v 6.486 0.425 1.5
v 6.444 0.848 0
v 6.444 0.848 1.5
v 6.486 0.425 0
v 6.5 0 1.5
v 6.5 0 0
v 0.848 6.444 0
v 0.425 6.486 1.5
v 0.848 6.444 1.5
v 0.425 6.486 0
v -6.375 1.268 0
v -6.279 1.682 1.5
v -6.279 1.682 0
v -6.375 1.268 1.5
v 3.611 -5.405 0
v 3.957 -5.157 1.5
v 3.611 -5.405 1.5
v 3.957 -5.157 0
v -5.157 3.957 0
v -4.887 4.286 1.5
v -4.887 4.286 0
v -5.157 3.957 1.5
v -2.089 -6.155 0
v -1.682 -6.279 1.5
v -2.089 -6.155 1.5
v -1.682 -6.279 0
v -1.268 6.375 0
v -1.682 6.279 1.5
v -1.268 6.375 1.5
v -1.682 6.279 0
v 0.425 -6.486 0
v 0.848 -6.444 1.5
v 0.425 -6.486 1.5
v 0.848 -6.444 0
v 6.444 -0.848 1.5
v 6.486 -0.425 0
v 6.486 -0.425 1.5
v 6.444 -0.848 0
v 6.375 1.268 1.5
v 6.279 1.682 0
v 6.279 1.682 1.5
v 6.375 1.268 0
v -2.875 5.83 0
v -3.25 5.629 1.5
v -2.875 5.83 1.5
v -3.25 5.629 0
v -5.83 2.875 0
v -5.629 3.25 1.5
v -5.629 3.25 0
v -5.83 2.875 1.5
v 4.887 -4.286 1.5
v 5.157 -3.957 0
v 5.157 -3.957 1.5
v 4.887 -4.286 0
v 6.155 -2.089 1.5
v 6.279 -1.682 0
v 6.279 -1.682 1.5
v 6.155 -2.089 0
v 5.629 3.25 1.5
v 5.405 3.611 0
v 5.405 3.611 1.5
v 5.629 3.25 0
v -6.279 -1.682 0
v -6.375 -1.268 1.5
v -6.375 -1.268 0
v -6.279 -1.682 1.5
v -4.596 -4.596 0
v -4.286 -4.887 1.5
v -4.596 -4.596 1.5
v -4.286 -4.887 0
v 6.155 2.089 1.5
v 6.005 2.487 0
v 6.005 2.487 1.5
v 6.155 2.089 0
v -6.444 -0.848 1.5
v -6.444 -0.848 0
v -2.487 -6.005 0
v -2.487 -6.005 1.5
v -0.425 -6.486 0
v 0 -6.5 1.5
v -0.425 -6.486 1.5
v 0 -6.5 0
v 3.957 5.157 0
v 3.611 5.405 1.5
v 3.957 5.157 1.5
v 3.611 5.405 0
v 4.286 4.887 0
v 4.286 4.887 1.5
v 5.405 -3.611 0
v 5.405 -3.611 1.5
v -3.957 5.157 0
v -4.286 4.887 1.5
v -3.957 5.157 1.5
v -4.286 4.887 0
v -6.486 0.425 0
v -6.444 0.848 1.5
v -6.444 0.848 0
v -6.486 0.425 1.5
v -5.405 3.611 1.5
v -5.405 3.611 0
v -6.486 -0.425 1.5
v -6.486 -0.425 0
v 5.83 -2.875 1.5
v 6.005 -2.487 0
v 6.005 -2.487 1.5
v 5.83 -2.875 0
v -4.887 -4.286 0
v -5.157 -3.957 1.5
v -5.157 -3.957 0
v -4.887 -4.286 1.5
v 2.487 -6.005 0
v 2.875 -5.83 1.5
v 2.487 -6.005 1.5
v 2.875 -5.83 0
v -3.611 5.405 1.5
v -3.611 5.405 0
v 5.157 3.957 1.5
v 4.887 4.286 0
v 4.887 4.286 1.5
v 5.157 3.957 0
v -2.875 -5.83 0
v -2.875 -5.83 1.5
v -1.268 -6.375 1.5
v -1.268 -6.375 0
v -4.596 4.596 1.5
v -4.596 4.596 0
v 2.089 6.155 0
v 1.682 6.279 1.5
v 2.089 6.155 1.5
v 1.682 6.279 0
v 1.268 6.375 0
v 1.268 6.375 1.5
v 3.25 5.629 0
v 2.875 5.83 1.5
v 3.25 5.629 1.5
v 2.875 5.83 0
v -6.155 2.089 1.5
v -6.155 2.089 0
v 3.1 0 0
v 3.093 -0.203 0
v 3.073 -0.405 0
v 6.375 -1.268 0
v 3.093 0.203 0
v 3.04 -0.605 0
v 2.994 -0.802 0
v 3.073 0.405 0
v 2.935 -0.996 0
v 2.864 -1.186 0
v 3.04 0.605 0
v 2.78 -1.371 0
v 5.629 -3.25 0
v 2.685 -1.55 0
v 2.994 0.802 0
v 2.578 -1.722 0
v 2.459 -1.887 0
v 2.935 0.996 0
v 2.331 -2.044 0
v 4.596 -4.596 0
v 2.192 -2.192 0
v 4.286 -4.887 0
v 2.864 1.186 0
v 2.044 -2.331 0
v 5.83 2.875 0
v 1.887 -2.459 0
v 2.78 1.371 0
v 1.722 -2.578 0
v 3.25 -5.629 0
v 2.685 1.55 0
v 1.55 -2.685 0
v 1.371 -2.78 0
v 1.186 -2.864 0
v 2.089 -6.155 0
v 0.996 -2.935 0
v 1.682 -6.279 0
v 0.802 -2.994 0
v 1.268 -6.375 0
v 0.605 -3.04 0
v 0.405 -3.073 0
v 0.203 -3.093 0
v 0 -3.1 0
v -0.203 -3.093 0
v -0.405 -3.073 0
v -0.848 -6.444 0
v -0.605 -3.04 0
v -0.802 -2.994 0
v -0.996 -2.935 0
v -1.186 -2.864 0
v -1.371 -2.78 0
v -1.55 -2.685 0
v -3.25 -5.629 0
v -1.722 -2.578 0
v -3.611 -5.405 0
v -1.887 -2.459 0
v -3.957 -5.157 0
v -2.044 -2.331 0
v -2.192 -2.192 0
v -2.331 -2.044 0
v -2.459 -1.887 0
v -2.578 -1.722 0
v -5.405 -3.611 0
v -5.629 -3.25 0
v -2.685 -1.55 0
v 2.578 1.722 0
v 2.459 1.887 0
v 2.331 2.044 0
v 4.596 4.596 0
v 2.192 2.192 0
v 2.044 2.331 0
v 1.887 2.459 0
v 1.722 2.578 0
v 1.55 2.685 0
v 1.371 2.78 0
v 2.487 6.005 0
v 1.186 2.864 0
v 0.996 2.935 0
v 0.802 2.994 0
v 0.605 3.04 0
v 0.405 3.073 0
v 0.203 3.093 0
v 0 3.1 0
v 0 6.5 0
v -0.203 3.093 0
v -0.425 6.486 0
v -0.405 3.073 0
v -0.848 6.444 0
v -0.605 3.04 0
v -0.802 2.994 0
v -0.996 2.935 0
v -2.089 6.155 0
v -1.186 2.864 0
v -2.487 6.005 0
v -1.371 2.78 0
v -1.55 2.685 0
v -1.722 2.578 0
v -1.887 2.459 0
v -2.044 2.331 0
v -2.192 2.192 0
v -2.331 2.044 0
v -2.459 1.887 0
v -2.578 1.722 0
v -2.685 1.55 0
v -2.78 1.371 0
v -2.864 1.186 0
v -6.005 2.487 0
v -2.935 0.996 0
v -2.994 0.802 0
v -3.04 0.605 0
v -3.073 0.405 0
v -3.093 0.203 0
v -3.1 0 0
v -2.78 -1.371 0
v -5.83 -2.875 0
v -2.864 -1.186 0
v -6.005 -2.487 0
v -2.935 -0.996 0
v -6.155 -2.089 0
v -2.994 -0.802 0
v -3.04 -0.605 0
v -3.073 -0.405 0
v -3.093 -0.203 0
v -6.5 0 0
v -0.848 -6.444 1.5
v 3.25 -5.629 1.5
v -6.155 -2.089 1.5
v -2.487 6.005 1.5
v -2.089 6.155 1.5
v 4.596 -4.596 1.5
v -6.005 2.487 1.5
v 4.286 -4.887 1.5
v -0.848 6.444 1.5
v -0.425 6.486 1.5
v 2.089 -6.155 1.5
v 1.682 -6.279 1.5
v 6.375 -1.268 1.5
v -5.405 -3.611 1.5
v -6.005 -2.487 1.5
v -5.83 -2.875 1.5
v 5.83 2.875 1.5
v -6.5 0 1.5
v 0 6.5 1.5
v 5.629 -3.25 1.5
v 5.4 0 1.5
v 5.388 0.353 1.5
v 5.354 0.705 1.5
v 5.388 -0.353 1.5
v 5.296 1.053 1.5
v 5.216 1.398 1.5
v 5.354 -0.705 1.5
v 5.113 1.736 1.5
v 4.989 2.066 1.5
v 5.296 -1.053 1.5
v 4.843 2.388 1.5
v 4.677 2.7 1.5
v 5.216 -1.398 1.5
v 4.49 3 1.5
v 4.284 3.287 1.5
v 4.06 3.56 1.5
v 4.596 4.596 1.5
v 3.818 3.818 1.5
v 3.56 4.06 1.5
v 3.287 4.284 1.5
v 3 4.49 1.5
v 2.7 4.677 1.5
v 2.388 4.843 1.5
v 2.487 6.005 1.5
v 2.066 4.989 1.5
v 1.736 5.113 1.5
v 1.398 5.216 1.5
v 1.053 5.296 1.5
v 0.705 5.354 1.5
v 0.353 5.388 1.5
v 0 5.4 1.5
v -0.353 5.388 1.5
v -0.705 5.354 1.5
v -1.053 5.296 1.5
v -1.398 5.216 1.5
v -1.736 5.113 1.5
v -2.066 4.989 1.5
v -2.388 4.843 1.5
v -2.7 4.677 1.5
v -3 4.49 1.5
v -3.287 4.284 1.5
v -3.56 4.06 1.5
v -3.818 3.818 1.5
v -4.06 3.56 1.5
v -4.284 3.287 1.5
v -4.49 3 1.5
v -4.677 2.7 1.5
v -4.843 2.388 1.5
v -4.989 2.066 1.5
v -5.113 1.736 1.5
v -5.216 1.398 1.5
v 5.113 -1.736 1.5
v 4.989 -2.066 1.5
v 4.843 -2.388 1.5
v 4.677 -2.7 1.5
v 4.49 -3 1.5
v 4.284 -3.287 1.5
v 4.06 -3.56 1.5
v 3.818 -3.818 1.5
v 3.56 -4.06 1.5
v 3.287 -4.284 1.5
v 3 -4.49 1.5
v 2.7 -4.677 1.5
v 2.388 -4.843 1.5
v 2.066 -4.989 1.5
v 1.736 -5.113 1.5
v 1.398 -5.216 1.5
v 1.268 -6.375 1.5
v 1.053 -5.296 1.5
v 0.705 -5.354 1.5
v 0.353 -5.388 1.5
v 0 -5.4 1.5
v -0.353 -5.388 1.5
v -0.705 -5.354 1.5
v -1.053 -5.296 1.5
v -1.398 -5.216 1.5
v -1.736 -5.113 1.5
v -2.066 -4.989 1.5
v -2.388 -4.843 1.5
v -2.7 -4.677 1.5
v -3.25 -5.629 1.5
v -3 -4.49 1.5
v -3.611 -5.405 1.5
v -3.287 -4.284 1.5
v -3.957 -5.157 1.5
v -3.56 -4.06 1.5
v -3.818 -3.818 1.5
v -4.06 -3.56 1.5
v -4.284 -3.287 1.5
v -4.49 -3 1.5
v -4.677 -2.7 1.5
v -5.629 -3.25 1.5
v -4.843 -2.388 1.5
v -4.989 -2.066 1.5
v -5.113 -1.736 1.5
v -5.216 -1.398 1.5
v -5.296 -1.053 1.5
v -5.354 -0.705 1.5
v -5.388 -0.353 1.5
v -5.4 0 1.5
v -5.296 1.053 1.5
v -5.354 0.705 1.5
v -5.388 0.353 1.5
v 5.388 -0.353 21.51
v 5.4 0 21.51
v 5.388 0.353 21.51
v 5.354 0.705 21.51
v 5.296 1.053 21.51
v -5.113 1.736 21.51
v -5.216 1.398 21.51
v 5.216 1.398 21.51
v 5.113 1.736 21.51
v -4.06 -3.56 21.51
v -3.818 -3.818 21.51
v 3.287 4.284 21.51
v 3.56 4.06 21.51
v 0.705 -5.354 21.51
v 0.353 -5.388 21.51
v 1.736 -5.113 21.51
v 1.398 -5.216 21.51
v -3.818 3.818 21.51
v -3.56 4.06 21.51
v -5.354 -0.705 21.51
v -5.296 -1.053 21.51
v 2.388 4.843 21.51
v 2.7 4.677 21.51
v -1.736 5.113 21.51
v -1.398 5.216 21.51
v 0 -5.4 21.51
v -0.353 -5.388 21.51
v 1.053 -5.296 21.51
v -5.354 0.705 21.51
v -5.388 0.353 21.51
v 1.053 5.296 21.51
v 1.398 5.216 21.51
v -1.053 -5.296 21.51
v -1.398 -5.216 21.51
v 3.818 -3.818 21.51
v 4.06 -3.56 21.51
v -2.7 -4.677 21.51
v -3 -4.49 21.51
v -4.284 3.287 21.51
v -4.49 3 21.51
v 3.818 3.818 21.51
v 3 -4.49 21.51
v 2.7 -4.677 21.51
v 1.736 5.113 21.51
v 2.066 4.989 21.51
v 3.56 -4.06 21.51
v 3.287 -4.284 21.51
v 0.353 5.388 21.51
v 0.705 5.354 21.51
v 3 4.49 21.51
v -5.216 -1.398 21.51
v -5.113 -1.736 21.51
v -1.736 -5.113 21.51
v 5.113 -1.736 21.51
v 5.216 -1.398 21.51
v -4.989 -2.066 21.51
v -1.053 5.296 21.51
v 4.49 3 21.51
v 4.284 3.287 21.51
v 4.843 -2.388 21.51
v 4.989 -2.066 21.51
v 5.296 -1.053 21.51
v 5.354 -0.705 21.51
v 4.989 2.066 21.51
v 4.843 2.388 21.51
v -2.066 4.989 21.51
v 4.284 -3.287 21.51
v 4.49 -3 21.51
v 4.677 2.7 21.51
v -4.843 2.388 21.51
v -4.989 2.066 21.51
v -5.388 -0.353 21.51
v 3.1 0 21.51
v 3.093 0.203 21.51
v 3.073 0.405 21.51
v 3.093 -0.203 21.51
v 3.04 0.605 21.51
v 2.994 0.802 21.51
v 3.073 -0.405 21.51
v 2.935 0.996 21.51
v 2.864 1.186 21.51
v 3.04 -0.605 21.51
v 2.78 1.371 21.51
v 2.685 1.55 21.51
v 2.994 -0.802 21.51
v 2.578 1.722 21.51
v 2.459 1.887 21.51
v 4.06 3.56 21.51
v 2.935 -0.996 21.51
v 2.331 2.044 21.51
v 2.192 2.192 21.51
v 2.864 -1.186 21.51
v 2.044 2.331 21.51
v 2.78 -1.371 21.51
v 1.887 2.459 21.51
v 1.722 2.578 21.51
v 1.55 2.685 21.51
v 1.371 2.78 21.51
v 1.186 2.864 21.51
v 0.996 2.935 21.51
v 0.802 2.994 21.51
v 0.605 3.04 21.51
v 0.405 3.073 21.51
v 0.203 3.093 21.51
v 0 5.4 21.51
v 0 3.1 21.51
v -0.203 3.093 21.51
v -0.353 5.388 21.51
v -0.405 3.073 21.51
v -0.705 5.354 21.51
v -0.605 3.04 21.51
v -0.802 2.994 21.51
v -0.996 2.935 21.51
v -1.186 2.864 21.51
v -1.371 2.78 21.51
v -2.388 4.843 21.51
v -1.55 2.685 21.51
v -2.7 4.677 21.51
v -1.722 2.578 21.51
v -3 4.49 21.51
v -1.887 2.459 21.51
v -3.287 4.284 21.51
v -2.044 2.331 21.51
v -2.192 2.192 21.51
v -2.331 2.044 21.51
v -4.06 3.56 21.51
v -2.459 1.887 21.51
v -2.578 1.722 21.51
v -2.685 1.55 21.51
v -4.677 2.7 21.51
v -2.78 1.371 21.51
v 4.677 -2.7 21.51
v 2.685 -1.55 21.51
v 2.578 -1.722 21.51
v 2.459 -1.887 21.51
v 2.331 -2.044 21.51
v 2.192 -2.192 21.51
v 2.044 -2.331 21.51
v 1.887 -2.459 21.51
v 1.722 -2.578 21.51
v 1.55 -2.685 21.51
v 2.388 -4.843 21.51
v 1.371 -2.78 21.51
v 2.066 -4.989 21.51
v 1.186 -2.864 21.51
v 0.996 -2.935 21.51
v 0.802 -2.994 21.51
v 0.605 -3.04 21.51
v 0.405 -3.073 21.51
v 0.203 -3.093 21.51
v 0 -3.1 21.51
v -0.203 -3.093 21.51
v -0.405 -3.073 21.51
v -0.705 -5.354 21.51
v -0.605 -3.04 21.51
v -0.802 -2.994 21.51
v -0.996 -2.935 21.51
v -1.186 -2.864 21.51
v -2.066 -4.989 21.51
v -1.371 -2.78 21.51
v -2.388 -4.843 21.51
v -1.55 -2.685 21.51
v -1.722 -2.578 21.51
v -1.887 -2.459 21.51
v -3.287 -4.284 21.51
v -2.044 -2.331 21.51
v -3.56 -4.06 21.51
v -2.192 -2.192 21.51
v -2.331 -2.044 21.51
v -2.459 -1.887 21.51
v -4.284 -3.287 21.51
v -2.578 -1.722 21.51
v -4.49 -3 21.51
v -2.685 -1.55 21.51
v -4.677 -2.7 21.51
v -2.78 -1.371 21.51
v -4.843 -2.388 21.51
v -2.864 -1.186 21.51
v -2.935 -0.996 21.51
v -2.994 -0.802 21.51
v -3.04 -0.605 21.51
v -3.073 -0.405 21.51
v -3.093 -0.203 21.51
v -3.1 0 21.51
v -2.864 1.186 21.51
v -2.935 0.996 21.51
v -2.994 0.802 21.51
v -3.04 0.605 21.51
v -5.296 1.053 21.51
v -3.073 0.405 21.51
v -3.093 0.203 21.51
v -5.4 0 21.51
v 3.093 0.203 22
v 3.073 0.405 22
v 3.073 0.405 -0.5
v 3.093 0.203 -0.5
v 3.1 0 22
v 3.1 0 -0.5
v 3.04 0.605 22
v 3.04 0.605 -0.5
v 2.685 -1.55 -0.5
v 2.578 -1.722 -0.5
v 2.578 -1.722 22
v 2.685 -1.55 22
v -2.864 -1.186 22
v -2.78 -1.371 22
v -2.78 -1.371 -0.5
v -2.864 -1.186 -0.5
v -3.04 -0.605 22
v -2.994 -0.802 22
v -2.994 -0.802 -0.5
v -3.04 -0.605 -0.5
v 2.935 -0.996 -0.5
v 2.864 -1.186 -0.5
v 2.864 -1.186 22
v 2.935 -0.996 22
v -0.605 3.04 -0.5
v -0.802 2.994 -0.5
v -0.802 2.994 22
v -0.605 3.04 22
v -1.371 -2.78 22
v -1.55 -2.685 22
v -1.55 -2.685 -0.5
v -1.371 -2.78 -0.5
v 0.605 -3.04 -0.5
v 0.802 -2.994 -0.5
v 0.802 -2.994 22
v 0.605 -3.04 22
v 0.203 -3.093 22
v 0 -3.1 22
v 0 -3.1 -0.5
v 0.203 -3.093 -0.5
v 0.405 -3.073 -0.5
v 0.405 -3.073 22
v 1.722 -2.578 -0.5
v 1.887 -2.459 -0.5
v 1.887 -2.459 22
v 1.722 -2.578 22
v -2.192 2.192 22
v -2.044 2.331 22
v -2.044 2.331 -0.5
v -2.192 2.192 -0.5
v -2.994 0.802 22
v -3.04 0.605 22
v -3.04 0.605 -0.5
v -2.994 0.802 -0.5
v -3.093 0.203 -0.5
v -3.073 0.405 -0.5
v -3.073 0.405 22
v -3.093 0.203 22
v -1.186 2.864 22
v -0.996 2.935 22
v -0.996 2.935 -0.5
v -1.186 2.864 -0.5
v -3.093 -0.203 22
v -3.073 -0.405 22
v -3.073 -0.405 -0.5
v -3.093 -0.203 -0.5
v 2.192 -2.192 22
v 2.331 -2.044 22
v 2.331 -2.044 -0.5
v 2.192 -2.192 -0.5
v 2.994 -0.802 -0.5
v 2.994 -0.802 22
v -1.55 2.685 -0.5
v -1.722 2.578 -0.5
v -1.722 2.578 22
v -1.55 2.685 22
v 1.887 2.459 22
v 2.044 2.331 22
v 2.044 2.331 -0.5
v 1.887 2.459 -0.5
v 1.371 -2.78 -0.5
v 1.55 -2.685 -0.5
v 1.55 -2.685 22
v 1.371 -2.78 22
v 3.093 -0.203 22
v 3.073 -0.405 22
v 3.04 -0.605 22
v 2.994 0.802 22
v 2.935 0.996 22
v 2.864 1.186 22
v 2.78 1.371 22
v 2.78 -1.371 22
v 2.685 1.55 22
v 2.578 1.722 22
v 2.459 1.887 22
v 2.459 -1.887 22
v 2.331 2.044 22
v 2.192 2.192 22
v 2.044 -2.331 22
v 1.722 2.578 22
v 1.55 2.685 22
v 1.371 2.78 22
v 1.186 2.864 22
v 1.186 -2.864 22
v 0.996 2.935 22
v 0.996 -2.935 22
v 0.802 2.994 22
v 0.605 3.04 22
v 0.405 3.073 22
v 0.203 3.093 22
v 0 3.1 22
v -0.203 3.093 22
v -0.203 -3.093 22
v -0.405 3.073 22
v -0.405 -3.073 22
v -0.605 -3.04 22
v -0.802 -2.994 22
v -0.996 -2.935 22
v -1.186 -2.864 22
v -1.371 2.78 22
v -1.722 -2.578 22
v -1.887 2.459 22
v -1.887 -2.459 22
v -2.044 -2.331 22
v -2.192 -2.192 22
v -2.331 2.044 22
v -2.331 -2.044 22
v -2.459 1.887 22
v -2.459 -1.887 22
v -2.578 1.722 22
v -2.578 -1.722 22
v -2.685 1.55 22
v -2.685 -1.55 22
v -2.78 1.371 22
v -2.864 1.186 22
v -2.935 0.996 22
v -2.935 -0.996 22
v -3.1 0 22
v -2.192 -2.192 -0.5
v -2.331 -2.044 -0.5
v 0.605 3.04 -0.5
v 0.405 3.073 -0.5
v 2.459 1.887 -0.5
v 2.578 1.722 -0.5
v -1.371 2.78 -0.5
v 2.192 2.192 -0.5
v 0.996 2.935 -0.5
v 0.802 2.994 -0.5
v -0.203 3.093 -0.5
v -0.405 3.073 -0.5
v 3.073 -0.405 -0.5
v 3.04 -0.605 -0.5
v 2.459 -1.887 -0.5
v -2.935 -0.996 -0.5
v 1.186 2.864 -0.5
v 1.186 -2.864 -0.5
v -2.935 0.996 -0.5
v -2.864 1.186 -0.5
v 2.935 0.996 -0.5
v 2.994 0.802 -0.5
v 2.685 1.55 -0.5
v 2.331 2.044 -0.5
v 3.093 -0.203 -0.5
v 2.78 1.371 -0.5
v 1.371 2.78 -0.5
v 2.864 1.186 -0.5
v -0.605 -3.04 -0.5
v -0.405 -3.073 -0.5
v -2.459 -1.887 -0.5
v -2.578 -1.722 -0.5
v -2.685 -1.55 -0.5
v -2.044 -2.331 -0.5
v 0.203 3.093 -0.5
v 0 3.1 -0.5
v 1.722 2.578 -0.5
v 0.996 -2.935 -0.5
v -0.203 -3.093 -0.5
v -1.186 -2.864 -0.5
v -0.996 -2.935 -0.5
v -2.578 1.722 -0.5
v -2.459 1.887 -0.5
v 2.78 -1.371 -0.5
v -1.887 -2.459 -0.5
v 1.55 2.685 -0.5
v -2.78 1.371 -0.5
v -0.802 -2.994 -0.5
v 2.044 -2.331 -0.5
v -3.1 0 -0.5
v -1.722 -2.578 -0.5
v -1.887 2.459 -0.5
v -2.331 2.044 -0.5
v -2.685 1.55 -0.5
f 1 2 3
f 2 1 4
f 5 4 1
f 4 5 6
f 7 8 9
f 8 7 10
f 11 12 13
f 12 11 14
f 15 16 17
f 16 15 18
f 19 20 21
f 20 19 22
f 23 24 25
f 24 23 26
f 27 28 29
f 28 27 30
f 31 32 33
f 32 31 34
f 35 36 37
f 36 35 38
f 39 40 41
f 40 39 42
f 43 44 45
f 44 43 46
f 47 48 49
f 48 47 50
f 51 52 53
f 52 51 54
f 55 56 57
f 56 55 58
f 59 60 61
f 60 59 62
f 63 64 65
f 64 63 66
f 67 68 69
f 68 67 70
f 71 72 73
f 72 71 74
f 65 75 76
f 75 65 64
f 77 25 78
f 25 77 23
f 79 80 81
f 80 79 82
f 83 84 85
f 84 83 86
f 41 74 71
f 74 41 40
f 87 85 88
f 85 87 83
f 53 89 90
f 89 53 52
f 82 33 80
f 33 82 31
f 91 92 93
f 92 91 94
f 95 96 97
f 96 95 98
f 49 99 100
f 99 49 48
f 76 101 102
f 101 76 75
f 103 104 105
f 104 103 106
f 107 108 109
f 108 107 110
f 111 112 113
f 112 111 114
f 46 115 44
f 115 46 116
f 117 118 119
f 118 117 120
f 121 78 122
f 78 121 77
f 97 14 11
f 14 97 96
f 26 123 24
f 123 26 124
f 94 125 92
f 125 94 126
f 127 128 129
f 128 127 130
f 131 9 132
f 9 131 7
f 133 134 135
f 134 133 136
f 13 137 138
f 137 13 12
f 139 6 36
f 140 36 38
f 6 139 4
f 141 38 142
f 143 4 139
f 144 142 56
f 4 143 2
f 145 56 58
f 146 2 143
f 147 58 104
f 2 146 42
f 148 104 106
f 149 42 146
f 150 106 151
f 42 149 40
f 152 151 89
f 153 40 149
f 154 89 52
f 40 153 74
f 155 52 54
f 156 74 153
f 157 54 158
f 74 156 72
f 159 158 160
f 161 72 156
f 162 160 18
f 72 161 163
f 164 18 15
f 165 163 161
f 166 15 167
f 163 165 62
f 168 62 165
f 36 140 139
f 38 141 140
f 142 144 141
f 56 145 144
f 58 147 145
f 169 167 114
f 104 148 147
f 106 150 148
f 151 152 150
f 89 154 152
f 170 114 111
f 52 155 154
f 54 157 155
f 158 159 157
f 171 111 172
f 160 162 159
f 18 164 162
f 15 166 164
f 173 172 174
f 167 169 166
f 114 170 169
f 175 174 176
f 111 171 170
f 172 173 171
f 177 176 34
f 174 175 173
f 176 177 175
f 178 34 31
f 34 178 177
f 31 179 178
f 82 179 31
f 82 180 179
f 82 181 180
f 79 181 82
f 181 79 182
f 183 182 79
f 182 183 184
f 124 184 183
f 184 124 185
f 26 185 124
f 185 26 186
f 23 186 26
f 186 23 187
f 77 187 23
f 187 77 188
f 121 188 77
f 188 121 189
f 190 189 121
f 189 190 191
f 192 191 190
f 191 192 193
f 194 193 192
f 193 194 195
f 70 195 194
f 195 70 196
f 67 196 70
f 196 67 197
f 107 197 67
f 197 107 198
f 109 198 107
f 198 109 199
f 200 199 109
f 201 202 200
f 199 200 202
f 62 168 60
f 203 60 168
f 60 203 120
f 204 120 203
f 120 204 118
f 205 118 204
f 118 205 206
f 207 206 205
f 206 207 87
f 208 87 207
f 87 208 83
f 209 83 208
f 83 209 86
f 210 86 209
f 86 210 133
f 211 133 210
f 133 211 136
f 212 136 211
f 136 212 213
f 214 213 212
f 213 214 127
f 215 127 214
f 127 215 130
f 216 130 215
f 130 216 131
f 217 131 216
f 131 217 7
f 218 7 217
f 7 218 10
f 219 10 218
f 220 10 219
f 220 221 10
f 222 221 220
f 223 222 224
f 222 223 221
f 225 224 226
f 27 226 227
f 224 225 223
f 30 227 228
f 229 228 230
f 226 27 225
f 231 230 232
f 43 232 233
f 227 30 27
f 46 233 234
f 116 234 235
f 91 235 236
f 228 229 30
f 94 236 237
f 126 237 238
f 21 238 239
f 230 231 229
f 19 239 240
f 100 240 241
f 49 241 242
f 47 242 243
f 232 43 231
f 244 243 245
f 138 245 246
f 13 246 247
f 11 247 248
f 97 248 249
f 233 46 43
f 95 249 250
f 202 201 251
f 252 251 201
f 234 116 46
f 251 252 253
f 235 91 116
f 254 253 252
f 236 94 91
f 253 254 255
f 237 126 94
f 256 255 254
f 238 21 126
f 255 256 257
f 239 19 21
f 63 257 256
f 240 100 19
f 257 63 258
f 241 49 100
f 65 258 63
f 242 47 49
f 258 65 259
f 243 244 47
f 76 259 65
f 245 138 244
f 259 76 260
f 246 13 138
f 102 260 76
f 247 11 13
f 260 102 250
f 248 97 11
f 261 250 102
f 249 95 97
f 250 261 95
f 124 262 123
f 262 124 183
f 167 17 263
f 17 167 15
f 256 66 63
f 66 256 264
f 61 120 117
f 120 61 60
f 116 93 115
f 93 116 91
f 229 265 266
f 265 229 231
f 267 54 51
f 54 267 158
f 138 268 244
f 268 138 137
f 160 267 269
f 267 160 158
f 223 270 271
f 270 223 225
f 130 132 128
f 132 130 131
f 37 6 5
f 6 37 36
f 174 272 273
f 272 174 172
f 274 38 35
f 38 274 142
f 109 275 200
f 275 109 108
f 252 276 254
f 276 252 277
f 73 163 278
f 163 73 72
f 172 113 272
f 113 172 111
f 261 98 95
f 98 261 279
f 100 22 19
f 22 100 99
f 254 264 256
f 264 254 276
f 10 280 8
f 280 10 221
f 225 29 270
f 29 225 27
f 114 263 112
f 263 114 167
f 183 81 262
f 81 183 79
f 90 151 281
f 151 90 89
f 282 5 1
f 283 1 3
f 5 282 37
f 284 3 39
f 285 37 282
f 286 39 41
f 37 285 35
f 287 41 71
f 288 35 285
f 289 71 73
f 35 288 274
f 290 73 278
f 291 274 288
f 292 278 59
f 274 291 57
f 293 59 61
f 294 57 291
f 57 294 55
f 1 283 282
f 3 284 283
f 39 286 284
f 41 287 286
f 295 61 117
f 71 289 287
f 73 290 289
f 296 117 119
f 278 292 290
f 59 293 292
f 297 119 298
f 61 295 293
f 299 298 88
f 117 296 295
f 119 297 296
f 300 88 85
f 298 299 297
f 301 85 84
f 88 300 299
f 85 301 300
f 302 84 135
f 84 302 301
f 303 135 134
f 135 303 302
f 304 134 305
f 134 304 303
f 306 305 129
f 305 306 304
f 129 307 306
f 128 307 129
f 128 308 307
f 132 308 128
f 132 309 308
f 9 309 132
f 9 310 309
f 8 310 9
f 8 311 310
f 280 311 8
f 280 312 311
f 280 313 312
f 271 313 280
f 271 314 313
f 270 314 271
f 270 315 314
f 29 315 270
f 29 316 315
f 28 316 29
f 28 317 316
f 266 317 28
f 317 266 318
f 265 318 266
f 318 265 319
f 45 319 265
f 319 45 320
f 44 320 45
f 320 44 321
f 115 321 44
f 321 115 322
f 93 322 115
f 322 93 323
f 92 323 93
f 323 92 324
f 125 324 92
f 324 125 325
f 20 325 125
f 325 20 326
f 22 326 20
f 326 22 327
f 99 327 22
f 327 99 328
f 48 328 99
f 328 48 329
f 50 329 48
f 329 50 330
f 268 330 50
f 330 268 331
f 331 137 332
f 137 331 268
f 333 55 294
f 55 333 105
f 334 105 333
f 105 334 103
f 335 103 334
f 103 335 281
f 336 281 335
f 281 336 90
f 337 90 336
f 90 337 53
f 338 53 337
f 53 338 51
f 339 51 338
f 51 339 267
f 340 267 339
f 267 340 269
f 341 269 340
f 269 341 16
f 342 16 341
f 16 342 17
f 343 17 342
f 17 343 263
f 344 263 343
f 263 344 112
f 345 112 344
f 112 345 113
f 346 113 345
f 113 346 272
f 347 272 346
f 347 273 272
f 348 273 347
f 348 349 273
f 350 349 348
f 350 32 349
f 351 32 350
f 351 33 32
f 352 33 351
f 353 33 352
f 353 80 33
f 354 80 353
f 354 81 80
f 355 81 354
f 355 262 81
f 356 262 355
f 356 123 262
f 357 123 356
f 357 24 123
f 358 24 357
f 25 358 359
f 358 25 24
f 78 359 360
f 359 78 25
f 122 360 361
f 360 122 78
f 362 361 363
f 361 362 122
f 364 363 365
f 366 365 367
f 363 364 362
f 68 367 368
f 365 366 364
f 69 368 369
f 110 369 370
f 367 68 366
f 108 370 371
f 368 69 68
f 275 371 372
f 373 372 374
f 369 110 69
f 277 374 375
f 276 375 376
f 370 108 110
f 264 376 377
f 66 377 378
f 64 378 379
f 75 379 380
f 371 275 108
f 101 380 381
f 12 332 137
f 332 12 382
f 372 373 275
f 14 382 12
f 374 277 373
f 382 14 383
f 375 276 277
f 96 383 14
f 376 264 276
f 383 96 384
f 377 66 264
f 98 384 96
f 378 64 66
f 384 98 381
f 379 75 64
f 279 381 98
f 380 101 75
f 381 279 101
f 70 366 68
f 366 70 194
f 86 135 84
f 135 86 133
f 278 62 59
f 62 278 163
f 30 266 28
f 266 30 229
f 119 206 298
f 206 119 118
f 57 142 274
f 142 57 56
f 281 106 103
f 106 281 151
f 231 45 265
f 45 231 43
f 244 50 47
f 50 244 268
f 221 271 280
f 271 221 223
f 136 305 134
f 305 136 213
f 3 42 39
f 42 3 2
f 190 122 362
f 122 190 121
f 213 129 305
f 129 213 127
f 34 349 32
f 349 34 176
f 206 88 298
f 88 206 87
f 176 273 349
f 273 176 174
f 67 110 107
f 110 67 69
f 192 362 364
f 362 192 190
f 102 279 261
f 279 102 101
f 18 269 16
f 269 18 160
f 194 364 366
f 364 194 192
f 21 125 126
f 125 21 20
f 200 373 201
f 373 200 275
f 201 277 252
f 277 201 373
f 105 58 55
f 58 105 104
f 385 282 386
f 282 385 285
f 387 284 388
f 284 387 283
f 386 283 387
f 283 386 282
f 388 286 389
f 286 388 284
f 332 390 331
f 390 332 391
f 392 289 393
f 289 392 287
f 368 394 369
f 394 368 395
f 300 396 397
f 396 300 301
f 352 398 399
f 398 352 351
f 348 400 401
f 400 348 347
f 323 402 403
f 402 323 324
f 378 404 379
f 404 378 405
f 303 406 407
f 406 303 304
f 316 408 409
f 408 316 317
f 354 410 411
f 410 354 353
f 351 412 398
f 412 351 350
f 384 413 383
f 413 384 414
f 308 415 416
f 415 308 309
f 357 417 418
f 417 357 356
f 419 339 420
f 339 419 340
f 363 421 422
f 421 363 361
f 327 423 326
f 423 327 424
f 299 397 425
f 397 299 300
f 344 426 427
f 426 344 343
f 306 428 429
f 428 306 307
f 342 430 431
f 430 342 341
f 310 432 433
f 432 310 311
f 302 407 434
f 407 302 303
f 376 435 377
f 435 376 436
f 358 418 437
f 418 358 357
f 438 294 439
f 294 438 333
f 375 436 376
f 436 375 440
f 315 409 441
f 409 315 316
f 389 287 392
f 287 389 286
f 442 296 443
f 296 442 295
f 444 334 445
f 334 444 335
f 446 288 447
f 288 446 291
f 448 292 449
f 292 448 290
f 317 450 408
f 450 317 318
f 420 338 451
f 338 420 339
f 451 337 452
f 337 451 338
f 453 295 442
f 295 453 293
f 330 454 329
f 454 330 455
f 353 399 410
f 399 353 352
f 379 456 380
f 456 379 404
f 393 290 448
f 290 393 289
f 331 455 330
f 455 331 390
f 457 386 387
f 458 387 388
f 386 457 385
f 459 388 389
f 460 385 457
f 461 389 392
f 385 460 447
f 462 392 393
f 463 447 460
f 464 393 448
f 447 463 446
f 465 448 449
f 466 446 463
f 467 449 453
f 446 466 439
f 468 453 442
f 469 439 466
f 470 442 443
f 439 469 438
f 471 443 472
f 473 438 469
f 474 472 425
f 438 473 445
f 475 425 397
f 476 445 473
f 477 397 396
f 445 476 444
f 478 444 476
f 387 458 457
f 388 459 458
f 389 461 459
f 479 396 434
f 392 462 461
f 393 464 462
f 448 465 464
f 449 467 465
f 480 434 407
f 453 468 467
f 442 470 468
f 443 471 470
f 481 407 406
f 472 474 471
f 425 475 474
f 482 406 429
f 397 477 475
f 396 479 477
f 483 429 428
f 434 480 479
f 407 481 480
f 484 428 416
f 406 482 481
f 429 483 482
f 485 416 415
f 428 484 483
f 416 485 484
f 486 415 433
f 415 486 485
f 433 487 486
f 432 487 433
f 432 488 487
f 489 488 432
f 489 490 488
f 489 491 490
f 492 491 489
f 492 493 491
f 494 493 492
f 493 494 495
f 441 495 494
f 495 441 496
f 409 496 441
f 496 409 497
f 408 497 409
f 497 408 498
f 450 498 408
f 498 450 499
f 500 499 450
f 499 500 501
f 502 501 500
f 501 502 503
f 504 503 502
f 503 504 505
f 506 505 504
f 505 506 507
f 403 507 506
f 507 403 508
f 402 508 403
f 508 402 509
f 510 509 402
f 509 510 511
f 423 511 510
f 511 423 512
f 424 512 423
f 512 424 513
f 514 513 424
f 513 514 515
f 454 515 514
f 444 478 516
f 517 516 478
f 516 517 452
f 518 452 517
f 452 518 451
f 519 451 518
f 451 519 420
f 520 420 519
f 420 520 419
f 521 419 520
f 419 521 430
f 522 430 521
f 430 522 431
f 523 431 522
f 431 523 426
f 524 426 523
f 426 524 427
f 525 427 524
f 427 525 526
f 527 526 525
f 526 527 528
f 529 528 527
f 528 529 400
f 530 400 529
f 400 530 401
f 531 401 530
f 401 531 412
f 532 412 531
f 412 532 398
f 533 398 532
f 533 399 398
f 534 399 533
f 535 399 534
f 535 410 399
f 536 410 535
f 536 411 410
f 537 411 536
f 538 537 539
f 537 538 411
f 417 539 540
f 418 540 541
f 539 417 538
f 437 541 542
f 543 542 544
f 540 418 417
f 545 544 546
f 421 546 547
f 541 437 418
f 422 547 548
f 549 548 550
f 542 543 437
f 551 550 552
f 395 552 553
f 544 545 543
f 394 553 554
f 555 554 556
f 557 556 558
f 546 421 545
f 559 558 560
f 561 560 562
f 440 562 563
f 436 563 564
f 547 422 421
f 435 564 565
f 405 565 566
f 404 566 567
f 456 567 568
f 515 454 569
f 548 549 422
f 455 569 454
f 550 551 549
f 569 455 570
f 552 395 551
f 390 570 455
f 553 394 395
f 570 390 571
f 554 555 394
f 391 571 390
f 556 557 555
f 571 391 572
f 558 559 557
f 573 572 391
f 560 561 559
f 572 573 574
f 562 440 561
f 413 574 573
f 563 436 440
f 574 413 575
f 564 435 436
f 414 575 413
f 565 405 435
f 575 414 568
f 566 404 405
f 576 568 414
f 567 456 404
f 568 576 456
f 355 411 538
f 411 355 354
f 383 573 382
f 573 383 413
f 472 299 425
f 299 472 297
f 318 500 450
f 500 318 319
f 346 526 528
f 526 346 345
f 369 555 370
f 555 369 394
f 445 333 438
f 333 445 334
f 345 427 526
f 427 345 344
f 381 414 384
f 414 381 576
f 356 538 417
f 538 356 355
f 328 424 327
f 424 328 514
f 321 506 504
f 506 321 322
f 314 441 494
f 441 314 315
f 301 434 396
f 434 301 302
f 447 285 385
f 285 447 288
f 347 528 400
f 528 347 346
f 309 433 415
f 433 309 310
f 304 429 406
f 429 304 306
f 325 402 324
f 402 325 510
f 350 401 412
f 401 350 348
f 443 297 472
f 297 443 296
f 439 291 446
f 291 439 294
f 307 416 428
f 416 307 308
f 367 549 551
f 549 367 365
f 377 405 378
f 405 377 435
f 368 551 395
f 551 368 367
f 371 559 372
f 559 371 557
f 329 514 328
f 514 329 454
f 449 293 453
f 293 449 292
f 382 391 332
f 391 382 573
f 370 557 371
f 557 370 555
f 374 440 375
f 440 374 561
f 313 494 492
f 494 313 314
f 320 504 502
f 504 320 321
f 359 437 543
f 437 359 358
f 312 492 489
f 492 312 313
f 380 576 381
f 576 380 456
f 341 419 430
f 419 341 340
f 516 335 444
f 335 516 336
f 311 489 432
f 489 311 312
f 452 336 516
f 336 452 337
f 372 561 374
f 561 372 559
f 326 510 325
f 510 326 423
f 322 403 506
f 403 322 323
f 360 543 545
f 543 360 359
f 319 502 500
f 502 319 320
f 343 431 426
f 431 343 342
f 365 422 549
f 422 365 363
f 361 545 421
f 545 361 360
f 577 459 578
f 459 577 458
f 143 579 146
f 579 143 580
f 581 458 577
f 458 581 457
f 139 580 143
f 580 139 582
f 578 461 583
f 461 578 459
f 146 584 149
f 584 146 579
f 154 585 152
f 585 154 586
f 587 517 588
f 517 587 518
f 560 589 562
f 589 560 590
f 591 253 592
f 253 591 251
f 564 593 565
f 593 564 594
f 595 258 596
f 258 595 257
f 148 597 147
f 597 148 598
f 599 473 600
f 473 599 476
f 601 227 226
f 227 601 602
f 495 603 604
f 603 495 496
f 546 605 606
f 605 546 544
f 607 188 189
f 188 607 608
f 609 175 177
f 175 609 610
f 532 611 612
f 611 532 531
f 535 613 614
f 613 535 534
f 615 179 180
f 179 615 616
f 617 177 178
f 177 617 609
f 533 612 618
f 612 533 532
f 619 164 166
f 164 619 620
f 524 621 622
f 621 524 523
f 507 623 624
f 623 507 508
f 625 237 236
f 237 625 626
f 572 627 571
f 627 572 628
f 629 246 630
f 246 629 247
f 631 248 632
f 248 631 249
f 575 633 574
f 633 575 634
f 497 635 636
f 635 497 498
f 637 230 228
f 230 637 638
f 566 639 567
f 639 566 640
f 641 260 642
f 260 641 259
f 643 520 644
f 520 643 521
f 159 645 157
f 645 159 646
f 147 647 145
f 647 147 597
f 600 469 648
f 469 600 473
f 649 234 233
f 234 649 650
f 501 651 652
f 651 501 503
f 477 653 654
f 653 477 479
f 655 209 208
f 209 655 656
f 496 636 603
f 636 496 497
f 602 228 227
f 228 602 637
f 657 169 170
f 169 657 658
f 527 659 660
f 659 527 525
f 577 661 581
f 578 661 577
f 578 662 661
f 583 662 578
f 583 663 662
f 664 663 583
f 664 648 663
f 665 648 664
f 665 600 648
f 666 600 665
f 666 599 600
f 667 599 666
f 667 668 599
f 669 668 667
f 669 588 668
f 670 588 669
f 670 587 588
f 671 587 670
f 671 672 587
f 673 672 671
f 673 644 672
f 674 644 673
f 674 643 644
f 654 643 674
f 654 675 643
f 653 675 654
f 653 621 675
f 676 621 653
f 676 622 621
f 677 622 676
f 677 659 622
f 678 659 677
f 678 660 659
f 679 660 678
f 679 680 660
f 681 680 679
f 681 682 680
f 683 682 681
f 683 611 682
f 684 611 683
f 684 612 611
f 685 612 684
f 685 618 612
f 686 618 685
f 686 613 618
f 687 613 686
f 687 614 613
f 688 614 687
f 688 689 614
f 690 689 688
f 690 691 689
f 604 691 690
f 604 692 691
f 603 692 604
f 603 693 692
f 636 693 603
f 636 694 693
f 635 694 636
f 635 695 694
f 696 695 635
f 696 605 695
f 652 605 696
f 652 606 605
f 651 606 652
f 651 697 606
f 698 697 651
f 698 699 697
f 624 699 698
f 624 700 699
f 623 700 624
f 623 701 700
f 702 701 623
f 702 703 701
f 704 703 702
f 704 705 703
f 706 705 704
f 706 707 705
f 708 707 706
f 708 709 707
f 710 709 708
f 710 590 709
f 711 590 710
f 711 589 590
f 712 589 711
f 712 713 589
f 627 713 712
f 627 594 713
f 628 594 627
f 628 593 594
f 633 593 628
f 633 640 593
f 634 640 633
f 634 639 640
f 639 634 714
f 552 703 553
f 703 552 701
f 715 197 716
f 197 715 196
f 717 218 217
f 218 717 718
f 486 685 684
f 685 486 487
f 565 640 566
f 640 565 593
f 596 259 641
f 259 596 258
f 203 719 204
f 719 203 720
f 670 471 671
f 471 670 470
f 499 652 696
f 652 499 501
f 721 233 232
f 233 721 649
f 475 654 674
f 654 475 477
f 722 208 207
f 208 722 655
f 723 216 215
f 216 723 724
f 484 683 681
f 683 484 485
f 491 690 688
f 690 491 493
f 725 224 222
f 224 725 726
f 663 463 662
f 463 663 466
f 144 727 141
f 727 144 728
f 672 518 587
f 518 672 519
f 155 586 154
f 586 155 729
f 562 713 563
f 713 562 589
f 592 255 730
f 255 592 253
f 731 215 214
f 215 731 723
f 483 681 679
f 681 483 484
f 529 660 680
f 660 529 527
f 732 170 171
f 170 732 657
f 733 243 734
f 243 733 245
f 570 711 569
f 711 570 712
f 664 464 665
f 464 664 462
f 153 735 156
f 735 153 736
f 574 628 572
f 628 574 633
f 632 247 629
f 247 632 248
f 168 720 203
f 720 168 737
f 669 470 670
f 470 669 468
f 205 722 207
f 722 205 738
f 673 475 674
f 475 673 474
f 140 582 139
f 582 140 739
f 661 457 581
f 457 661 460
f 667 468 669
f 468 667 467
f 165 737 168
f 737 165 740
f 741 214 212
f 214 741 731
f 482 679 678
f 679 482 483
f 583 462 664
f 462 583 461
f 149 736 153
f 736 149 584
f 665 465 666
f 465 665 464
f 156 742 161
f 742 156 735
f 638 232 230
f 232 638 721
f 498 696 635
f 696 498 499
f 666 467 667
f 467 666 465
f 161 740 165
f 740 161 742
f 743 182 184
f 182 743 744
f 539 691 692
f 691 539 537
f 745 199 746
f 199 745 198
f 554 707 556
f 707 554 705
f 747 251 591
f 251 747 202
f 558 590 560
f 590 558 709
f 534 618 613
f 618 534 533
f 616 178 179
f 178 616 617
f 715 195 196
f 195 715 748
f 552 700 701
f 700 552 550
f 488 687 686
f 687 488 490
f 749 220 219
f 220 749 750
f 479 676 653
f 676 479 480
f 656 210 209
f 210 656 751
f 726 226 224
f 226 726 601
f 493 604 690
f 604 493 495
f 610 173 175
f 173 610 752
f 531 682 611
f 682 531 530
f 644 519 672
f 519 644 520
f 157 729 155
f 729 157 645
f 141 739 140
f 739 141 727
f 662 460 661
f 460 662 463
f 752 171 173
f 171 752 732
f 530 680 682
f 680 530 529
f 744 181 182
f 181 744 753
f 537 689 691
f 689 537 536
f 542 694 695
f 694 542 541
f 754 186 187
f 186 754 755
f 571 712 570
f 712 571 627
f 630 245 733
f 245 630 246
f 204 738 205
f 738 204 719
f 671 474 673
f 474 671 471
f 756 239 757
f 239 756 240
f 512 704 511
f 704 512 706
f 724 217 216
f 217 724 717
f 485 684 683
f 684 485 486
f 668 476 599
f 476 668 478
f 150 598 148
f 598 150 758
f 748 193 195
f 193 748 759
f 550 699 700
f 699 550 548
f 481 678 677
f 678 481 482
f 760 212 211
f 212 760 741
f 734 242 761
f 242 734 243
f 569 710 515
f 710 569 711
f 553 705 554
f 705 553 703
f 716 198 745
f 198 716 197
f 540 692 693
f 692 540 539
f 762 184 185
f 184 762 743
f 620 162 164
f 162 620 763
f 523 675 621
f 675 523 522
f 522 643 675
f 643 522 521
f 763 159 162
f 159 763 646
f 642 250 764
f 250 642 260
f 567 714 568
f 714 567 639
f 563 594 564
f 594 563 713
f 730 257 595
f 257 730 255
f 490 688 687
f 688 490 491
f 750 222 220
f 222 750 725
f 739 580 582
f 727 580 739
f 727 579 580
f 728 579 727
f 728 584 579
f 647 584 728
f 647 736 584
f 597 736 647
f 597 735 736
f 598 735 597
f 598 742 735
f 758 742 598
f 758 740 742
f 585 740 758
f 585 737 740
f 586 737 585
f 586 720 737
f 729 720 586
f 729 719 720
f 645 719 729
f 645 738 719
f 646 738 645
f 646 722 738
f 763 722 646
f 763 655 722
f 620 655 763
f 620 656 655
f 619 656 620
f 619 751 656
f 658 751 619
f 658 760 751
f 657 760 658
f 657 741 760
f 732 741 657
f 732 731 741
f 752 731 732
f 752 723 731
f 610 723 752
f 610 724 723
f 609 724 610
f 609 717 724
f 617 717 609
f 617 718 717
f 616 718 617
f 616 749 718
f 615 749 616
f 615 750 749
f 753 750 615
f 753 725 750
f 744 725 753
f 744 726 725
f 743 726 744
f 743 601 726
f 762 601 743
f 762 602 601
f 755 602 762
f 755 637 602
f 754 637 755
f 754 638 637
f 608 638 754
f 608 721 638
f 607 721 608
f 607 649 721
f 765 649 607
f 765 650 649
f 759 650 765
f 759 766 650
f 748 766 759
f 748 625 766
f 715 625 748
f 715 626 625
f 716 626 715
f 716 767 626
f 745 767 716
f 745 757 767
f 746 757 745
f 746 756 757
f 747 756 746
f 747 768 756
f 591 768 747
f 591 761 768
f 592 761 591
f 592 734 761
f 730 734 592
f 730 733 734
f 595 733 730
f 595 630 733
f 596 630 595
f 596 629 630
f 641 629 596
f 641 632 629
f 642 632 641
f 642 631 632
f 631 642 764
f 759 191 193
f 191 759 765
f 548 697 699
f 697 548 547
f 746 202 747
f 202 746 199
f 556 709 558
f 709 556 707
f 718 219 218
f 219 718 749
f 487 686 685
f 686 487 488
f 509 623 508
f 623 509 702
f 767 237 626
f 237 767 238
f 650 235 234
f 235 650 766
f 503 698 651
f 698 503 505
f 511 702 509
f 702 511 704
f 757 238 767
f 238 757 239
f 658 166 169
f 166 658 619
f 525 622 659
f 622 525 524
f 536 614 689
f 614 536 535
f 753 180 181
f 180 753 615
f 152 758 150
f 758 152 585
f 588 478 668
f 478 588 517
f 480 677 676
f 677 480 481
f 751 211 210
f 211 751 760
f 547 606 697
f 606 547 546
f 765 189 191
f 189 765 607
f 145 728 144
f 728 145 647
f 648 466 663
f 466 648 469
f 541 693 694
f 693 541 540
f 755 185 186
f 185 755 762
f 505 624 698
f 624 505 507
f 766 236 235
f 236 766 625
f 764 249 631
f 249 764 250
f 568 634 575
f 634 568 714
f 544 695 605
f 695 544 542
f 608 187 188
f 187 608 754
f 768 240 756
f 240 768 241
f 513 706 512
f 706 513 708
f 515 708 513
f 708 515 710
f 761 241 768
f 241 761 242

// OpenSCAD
// Adapter sleeve: 0.2 mL PCR tube for 1.5 mL tube rack holes
// Print orientation: collar on bed (z = 0), sleeve body builds upward

// ---- Dimensions (mm) ----
collar_d        = 13;     // collar outer diameter
collar_t        = 1.5;    // collar thickness (z = 0 to 1.5)
sleeve_d        = 10.8;   // sleeve body outer diameter
sleeve_h        = 20;     // sleeve body height (z = 1.5 to 21.5)
bore_d          = 6.2;    // through-bore diameter
eps             = 0.5;    // cutter overshoot past faces

$fn = 96;

// ---- Model ----
union() {
    // Collar
    cylinder(d = collar_d, h = collar_t);
    // Sleeve body (slightly overlapping the collar for a clean union)
    translate([0, 0, collar_t - 0.01])
        cylinder(d = sleeve_d, h = sleeve_h + 0.02);
    // Through bore
    translate([0, 0, -eps])
        cylinder(d = bore_d, h = sleeve_h + collar_t + 2 * eps);
}
